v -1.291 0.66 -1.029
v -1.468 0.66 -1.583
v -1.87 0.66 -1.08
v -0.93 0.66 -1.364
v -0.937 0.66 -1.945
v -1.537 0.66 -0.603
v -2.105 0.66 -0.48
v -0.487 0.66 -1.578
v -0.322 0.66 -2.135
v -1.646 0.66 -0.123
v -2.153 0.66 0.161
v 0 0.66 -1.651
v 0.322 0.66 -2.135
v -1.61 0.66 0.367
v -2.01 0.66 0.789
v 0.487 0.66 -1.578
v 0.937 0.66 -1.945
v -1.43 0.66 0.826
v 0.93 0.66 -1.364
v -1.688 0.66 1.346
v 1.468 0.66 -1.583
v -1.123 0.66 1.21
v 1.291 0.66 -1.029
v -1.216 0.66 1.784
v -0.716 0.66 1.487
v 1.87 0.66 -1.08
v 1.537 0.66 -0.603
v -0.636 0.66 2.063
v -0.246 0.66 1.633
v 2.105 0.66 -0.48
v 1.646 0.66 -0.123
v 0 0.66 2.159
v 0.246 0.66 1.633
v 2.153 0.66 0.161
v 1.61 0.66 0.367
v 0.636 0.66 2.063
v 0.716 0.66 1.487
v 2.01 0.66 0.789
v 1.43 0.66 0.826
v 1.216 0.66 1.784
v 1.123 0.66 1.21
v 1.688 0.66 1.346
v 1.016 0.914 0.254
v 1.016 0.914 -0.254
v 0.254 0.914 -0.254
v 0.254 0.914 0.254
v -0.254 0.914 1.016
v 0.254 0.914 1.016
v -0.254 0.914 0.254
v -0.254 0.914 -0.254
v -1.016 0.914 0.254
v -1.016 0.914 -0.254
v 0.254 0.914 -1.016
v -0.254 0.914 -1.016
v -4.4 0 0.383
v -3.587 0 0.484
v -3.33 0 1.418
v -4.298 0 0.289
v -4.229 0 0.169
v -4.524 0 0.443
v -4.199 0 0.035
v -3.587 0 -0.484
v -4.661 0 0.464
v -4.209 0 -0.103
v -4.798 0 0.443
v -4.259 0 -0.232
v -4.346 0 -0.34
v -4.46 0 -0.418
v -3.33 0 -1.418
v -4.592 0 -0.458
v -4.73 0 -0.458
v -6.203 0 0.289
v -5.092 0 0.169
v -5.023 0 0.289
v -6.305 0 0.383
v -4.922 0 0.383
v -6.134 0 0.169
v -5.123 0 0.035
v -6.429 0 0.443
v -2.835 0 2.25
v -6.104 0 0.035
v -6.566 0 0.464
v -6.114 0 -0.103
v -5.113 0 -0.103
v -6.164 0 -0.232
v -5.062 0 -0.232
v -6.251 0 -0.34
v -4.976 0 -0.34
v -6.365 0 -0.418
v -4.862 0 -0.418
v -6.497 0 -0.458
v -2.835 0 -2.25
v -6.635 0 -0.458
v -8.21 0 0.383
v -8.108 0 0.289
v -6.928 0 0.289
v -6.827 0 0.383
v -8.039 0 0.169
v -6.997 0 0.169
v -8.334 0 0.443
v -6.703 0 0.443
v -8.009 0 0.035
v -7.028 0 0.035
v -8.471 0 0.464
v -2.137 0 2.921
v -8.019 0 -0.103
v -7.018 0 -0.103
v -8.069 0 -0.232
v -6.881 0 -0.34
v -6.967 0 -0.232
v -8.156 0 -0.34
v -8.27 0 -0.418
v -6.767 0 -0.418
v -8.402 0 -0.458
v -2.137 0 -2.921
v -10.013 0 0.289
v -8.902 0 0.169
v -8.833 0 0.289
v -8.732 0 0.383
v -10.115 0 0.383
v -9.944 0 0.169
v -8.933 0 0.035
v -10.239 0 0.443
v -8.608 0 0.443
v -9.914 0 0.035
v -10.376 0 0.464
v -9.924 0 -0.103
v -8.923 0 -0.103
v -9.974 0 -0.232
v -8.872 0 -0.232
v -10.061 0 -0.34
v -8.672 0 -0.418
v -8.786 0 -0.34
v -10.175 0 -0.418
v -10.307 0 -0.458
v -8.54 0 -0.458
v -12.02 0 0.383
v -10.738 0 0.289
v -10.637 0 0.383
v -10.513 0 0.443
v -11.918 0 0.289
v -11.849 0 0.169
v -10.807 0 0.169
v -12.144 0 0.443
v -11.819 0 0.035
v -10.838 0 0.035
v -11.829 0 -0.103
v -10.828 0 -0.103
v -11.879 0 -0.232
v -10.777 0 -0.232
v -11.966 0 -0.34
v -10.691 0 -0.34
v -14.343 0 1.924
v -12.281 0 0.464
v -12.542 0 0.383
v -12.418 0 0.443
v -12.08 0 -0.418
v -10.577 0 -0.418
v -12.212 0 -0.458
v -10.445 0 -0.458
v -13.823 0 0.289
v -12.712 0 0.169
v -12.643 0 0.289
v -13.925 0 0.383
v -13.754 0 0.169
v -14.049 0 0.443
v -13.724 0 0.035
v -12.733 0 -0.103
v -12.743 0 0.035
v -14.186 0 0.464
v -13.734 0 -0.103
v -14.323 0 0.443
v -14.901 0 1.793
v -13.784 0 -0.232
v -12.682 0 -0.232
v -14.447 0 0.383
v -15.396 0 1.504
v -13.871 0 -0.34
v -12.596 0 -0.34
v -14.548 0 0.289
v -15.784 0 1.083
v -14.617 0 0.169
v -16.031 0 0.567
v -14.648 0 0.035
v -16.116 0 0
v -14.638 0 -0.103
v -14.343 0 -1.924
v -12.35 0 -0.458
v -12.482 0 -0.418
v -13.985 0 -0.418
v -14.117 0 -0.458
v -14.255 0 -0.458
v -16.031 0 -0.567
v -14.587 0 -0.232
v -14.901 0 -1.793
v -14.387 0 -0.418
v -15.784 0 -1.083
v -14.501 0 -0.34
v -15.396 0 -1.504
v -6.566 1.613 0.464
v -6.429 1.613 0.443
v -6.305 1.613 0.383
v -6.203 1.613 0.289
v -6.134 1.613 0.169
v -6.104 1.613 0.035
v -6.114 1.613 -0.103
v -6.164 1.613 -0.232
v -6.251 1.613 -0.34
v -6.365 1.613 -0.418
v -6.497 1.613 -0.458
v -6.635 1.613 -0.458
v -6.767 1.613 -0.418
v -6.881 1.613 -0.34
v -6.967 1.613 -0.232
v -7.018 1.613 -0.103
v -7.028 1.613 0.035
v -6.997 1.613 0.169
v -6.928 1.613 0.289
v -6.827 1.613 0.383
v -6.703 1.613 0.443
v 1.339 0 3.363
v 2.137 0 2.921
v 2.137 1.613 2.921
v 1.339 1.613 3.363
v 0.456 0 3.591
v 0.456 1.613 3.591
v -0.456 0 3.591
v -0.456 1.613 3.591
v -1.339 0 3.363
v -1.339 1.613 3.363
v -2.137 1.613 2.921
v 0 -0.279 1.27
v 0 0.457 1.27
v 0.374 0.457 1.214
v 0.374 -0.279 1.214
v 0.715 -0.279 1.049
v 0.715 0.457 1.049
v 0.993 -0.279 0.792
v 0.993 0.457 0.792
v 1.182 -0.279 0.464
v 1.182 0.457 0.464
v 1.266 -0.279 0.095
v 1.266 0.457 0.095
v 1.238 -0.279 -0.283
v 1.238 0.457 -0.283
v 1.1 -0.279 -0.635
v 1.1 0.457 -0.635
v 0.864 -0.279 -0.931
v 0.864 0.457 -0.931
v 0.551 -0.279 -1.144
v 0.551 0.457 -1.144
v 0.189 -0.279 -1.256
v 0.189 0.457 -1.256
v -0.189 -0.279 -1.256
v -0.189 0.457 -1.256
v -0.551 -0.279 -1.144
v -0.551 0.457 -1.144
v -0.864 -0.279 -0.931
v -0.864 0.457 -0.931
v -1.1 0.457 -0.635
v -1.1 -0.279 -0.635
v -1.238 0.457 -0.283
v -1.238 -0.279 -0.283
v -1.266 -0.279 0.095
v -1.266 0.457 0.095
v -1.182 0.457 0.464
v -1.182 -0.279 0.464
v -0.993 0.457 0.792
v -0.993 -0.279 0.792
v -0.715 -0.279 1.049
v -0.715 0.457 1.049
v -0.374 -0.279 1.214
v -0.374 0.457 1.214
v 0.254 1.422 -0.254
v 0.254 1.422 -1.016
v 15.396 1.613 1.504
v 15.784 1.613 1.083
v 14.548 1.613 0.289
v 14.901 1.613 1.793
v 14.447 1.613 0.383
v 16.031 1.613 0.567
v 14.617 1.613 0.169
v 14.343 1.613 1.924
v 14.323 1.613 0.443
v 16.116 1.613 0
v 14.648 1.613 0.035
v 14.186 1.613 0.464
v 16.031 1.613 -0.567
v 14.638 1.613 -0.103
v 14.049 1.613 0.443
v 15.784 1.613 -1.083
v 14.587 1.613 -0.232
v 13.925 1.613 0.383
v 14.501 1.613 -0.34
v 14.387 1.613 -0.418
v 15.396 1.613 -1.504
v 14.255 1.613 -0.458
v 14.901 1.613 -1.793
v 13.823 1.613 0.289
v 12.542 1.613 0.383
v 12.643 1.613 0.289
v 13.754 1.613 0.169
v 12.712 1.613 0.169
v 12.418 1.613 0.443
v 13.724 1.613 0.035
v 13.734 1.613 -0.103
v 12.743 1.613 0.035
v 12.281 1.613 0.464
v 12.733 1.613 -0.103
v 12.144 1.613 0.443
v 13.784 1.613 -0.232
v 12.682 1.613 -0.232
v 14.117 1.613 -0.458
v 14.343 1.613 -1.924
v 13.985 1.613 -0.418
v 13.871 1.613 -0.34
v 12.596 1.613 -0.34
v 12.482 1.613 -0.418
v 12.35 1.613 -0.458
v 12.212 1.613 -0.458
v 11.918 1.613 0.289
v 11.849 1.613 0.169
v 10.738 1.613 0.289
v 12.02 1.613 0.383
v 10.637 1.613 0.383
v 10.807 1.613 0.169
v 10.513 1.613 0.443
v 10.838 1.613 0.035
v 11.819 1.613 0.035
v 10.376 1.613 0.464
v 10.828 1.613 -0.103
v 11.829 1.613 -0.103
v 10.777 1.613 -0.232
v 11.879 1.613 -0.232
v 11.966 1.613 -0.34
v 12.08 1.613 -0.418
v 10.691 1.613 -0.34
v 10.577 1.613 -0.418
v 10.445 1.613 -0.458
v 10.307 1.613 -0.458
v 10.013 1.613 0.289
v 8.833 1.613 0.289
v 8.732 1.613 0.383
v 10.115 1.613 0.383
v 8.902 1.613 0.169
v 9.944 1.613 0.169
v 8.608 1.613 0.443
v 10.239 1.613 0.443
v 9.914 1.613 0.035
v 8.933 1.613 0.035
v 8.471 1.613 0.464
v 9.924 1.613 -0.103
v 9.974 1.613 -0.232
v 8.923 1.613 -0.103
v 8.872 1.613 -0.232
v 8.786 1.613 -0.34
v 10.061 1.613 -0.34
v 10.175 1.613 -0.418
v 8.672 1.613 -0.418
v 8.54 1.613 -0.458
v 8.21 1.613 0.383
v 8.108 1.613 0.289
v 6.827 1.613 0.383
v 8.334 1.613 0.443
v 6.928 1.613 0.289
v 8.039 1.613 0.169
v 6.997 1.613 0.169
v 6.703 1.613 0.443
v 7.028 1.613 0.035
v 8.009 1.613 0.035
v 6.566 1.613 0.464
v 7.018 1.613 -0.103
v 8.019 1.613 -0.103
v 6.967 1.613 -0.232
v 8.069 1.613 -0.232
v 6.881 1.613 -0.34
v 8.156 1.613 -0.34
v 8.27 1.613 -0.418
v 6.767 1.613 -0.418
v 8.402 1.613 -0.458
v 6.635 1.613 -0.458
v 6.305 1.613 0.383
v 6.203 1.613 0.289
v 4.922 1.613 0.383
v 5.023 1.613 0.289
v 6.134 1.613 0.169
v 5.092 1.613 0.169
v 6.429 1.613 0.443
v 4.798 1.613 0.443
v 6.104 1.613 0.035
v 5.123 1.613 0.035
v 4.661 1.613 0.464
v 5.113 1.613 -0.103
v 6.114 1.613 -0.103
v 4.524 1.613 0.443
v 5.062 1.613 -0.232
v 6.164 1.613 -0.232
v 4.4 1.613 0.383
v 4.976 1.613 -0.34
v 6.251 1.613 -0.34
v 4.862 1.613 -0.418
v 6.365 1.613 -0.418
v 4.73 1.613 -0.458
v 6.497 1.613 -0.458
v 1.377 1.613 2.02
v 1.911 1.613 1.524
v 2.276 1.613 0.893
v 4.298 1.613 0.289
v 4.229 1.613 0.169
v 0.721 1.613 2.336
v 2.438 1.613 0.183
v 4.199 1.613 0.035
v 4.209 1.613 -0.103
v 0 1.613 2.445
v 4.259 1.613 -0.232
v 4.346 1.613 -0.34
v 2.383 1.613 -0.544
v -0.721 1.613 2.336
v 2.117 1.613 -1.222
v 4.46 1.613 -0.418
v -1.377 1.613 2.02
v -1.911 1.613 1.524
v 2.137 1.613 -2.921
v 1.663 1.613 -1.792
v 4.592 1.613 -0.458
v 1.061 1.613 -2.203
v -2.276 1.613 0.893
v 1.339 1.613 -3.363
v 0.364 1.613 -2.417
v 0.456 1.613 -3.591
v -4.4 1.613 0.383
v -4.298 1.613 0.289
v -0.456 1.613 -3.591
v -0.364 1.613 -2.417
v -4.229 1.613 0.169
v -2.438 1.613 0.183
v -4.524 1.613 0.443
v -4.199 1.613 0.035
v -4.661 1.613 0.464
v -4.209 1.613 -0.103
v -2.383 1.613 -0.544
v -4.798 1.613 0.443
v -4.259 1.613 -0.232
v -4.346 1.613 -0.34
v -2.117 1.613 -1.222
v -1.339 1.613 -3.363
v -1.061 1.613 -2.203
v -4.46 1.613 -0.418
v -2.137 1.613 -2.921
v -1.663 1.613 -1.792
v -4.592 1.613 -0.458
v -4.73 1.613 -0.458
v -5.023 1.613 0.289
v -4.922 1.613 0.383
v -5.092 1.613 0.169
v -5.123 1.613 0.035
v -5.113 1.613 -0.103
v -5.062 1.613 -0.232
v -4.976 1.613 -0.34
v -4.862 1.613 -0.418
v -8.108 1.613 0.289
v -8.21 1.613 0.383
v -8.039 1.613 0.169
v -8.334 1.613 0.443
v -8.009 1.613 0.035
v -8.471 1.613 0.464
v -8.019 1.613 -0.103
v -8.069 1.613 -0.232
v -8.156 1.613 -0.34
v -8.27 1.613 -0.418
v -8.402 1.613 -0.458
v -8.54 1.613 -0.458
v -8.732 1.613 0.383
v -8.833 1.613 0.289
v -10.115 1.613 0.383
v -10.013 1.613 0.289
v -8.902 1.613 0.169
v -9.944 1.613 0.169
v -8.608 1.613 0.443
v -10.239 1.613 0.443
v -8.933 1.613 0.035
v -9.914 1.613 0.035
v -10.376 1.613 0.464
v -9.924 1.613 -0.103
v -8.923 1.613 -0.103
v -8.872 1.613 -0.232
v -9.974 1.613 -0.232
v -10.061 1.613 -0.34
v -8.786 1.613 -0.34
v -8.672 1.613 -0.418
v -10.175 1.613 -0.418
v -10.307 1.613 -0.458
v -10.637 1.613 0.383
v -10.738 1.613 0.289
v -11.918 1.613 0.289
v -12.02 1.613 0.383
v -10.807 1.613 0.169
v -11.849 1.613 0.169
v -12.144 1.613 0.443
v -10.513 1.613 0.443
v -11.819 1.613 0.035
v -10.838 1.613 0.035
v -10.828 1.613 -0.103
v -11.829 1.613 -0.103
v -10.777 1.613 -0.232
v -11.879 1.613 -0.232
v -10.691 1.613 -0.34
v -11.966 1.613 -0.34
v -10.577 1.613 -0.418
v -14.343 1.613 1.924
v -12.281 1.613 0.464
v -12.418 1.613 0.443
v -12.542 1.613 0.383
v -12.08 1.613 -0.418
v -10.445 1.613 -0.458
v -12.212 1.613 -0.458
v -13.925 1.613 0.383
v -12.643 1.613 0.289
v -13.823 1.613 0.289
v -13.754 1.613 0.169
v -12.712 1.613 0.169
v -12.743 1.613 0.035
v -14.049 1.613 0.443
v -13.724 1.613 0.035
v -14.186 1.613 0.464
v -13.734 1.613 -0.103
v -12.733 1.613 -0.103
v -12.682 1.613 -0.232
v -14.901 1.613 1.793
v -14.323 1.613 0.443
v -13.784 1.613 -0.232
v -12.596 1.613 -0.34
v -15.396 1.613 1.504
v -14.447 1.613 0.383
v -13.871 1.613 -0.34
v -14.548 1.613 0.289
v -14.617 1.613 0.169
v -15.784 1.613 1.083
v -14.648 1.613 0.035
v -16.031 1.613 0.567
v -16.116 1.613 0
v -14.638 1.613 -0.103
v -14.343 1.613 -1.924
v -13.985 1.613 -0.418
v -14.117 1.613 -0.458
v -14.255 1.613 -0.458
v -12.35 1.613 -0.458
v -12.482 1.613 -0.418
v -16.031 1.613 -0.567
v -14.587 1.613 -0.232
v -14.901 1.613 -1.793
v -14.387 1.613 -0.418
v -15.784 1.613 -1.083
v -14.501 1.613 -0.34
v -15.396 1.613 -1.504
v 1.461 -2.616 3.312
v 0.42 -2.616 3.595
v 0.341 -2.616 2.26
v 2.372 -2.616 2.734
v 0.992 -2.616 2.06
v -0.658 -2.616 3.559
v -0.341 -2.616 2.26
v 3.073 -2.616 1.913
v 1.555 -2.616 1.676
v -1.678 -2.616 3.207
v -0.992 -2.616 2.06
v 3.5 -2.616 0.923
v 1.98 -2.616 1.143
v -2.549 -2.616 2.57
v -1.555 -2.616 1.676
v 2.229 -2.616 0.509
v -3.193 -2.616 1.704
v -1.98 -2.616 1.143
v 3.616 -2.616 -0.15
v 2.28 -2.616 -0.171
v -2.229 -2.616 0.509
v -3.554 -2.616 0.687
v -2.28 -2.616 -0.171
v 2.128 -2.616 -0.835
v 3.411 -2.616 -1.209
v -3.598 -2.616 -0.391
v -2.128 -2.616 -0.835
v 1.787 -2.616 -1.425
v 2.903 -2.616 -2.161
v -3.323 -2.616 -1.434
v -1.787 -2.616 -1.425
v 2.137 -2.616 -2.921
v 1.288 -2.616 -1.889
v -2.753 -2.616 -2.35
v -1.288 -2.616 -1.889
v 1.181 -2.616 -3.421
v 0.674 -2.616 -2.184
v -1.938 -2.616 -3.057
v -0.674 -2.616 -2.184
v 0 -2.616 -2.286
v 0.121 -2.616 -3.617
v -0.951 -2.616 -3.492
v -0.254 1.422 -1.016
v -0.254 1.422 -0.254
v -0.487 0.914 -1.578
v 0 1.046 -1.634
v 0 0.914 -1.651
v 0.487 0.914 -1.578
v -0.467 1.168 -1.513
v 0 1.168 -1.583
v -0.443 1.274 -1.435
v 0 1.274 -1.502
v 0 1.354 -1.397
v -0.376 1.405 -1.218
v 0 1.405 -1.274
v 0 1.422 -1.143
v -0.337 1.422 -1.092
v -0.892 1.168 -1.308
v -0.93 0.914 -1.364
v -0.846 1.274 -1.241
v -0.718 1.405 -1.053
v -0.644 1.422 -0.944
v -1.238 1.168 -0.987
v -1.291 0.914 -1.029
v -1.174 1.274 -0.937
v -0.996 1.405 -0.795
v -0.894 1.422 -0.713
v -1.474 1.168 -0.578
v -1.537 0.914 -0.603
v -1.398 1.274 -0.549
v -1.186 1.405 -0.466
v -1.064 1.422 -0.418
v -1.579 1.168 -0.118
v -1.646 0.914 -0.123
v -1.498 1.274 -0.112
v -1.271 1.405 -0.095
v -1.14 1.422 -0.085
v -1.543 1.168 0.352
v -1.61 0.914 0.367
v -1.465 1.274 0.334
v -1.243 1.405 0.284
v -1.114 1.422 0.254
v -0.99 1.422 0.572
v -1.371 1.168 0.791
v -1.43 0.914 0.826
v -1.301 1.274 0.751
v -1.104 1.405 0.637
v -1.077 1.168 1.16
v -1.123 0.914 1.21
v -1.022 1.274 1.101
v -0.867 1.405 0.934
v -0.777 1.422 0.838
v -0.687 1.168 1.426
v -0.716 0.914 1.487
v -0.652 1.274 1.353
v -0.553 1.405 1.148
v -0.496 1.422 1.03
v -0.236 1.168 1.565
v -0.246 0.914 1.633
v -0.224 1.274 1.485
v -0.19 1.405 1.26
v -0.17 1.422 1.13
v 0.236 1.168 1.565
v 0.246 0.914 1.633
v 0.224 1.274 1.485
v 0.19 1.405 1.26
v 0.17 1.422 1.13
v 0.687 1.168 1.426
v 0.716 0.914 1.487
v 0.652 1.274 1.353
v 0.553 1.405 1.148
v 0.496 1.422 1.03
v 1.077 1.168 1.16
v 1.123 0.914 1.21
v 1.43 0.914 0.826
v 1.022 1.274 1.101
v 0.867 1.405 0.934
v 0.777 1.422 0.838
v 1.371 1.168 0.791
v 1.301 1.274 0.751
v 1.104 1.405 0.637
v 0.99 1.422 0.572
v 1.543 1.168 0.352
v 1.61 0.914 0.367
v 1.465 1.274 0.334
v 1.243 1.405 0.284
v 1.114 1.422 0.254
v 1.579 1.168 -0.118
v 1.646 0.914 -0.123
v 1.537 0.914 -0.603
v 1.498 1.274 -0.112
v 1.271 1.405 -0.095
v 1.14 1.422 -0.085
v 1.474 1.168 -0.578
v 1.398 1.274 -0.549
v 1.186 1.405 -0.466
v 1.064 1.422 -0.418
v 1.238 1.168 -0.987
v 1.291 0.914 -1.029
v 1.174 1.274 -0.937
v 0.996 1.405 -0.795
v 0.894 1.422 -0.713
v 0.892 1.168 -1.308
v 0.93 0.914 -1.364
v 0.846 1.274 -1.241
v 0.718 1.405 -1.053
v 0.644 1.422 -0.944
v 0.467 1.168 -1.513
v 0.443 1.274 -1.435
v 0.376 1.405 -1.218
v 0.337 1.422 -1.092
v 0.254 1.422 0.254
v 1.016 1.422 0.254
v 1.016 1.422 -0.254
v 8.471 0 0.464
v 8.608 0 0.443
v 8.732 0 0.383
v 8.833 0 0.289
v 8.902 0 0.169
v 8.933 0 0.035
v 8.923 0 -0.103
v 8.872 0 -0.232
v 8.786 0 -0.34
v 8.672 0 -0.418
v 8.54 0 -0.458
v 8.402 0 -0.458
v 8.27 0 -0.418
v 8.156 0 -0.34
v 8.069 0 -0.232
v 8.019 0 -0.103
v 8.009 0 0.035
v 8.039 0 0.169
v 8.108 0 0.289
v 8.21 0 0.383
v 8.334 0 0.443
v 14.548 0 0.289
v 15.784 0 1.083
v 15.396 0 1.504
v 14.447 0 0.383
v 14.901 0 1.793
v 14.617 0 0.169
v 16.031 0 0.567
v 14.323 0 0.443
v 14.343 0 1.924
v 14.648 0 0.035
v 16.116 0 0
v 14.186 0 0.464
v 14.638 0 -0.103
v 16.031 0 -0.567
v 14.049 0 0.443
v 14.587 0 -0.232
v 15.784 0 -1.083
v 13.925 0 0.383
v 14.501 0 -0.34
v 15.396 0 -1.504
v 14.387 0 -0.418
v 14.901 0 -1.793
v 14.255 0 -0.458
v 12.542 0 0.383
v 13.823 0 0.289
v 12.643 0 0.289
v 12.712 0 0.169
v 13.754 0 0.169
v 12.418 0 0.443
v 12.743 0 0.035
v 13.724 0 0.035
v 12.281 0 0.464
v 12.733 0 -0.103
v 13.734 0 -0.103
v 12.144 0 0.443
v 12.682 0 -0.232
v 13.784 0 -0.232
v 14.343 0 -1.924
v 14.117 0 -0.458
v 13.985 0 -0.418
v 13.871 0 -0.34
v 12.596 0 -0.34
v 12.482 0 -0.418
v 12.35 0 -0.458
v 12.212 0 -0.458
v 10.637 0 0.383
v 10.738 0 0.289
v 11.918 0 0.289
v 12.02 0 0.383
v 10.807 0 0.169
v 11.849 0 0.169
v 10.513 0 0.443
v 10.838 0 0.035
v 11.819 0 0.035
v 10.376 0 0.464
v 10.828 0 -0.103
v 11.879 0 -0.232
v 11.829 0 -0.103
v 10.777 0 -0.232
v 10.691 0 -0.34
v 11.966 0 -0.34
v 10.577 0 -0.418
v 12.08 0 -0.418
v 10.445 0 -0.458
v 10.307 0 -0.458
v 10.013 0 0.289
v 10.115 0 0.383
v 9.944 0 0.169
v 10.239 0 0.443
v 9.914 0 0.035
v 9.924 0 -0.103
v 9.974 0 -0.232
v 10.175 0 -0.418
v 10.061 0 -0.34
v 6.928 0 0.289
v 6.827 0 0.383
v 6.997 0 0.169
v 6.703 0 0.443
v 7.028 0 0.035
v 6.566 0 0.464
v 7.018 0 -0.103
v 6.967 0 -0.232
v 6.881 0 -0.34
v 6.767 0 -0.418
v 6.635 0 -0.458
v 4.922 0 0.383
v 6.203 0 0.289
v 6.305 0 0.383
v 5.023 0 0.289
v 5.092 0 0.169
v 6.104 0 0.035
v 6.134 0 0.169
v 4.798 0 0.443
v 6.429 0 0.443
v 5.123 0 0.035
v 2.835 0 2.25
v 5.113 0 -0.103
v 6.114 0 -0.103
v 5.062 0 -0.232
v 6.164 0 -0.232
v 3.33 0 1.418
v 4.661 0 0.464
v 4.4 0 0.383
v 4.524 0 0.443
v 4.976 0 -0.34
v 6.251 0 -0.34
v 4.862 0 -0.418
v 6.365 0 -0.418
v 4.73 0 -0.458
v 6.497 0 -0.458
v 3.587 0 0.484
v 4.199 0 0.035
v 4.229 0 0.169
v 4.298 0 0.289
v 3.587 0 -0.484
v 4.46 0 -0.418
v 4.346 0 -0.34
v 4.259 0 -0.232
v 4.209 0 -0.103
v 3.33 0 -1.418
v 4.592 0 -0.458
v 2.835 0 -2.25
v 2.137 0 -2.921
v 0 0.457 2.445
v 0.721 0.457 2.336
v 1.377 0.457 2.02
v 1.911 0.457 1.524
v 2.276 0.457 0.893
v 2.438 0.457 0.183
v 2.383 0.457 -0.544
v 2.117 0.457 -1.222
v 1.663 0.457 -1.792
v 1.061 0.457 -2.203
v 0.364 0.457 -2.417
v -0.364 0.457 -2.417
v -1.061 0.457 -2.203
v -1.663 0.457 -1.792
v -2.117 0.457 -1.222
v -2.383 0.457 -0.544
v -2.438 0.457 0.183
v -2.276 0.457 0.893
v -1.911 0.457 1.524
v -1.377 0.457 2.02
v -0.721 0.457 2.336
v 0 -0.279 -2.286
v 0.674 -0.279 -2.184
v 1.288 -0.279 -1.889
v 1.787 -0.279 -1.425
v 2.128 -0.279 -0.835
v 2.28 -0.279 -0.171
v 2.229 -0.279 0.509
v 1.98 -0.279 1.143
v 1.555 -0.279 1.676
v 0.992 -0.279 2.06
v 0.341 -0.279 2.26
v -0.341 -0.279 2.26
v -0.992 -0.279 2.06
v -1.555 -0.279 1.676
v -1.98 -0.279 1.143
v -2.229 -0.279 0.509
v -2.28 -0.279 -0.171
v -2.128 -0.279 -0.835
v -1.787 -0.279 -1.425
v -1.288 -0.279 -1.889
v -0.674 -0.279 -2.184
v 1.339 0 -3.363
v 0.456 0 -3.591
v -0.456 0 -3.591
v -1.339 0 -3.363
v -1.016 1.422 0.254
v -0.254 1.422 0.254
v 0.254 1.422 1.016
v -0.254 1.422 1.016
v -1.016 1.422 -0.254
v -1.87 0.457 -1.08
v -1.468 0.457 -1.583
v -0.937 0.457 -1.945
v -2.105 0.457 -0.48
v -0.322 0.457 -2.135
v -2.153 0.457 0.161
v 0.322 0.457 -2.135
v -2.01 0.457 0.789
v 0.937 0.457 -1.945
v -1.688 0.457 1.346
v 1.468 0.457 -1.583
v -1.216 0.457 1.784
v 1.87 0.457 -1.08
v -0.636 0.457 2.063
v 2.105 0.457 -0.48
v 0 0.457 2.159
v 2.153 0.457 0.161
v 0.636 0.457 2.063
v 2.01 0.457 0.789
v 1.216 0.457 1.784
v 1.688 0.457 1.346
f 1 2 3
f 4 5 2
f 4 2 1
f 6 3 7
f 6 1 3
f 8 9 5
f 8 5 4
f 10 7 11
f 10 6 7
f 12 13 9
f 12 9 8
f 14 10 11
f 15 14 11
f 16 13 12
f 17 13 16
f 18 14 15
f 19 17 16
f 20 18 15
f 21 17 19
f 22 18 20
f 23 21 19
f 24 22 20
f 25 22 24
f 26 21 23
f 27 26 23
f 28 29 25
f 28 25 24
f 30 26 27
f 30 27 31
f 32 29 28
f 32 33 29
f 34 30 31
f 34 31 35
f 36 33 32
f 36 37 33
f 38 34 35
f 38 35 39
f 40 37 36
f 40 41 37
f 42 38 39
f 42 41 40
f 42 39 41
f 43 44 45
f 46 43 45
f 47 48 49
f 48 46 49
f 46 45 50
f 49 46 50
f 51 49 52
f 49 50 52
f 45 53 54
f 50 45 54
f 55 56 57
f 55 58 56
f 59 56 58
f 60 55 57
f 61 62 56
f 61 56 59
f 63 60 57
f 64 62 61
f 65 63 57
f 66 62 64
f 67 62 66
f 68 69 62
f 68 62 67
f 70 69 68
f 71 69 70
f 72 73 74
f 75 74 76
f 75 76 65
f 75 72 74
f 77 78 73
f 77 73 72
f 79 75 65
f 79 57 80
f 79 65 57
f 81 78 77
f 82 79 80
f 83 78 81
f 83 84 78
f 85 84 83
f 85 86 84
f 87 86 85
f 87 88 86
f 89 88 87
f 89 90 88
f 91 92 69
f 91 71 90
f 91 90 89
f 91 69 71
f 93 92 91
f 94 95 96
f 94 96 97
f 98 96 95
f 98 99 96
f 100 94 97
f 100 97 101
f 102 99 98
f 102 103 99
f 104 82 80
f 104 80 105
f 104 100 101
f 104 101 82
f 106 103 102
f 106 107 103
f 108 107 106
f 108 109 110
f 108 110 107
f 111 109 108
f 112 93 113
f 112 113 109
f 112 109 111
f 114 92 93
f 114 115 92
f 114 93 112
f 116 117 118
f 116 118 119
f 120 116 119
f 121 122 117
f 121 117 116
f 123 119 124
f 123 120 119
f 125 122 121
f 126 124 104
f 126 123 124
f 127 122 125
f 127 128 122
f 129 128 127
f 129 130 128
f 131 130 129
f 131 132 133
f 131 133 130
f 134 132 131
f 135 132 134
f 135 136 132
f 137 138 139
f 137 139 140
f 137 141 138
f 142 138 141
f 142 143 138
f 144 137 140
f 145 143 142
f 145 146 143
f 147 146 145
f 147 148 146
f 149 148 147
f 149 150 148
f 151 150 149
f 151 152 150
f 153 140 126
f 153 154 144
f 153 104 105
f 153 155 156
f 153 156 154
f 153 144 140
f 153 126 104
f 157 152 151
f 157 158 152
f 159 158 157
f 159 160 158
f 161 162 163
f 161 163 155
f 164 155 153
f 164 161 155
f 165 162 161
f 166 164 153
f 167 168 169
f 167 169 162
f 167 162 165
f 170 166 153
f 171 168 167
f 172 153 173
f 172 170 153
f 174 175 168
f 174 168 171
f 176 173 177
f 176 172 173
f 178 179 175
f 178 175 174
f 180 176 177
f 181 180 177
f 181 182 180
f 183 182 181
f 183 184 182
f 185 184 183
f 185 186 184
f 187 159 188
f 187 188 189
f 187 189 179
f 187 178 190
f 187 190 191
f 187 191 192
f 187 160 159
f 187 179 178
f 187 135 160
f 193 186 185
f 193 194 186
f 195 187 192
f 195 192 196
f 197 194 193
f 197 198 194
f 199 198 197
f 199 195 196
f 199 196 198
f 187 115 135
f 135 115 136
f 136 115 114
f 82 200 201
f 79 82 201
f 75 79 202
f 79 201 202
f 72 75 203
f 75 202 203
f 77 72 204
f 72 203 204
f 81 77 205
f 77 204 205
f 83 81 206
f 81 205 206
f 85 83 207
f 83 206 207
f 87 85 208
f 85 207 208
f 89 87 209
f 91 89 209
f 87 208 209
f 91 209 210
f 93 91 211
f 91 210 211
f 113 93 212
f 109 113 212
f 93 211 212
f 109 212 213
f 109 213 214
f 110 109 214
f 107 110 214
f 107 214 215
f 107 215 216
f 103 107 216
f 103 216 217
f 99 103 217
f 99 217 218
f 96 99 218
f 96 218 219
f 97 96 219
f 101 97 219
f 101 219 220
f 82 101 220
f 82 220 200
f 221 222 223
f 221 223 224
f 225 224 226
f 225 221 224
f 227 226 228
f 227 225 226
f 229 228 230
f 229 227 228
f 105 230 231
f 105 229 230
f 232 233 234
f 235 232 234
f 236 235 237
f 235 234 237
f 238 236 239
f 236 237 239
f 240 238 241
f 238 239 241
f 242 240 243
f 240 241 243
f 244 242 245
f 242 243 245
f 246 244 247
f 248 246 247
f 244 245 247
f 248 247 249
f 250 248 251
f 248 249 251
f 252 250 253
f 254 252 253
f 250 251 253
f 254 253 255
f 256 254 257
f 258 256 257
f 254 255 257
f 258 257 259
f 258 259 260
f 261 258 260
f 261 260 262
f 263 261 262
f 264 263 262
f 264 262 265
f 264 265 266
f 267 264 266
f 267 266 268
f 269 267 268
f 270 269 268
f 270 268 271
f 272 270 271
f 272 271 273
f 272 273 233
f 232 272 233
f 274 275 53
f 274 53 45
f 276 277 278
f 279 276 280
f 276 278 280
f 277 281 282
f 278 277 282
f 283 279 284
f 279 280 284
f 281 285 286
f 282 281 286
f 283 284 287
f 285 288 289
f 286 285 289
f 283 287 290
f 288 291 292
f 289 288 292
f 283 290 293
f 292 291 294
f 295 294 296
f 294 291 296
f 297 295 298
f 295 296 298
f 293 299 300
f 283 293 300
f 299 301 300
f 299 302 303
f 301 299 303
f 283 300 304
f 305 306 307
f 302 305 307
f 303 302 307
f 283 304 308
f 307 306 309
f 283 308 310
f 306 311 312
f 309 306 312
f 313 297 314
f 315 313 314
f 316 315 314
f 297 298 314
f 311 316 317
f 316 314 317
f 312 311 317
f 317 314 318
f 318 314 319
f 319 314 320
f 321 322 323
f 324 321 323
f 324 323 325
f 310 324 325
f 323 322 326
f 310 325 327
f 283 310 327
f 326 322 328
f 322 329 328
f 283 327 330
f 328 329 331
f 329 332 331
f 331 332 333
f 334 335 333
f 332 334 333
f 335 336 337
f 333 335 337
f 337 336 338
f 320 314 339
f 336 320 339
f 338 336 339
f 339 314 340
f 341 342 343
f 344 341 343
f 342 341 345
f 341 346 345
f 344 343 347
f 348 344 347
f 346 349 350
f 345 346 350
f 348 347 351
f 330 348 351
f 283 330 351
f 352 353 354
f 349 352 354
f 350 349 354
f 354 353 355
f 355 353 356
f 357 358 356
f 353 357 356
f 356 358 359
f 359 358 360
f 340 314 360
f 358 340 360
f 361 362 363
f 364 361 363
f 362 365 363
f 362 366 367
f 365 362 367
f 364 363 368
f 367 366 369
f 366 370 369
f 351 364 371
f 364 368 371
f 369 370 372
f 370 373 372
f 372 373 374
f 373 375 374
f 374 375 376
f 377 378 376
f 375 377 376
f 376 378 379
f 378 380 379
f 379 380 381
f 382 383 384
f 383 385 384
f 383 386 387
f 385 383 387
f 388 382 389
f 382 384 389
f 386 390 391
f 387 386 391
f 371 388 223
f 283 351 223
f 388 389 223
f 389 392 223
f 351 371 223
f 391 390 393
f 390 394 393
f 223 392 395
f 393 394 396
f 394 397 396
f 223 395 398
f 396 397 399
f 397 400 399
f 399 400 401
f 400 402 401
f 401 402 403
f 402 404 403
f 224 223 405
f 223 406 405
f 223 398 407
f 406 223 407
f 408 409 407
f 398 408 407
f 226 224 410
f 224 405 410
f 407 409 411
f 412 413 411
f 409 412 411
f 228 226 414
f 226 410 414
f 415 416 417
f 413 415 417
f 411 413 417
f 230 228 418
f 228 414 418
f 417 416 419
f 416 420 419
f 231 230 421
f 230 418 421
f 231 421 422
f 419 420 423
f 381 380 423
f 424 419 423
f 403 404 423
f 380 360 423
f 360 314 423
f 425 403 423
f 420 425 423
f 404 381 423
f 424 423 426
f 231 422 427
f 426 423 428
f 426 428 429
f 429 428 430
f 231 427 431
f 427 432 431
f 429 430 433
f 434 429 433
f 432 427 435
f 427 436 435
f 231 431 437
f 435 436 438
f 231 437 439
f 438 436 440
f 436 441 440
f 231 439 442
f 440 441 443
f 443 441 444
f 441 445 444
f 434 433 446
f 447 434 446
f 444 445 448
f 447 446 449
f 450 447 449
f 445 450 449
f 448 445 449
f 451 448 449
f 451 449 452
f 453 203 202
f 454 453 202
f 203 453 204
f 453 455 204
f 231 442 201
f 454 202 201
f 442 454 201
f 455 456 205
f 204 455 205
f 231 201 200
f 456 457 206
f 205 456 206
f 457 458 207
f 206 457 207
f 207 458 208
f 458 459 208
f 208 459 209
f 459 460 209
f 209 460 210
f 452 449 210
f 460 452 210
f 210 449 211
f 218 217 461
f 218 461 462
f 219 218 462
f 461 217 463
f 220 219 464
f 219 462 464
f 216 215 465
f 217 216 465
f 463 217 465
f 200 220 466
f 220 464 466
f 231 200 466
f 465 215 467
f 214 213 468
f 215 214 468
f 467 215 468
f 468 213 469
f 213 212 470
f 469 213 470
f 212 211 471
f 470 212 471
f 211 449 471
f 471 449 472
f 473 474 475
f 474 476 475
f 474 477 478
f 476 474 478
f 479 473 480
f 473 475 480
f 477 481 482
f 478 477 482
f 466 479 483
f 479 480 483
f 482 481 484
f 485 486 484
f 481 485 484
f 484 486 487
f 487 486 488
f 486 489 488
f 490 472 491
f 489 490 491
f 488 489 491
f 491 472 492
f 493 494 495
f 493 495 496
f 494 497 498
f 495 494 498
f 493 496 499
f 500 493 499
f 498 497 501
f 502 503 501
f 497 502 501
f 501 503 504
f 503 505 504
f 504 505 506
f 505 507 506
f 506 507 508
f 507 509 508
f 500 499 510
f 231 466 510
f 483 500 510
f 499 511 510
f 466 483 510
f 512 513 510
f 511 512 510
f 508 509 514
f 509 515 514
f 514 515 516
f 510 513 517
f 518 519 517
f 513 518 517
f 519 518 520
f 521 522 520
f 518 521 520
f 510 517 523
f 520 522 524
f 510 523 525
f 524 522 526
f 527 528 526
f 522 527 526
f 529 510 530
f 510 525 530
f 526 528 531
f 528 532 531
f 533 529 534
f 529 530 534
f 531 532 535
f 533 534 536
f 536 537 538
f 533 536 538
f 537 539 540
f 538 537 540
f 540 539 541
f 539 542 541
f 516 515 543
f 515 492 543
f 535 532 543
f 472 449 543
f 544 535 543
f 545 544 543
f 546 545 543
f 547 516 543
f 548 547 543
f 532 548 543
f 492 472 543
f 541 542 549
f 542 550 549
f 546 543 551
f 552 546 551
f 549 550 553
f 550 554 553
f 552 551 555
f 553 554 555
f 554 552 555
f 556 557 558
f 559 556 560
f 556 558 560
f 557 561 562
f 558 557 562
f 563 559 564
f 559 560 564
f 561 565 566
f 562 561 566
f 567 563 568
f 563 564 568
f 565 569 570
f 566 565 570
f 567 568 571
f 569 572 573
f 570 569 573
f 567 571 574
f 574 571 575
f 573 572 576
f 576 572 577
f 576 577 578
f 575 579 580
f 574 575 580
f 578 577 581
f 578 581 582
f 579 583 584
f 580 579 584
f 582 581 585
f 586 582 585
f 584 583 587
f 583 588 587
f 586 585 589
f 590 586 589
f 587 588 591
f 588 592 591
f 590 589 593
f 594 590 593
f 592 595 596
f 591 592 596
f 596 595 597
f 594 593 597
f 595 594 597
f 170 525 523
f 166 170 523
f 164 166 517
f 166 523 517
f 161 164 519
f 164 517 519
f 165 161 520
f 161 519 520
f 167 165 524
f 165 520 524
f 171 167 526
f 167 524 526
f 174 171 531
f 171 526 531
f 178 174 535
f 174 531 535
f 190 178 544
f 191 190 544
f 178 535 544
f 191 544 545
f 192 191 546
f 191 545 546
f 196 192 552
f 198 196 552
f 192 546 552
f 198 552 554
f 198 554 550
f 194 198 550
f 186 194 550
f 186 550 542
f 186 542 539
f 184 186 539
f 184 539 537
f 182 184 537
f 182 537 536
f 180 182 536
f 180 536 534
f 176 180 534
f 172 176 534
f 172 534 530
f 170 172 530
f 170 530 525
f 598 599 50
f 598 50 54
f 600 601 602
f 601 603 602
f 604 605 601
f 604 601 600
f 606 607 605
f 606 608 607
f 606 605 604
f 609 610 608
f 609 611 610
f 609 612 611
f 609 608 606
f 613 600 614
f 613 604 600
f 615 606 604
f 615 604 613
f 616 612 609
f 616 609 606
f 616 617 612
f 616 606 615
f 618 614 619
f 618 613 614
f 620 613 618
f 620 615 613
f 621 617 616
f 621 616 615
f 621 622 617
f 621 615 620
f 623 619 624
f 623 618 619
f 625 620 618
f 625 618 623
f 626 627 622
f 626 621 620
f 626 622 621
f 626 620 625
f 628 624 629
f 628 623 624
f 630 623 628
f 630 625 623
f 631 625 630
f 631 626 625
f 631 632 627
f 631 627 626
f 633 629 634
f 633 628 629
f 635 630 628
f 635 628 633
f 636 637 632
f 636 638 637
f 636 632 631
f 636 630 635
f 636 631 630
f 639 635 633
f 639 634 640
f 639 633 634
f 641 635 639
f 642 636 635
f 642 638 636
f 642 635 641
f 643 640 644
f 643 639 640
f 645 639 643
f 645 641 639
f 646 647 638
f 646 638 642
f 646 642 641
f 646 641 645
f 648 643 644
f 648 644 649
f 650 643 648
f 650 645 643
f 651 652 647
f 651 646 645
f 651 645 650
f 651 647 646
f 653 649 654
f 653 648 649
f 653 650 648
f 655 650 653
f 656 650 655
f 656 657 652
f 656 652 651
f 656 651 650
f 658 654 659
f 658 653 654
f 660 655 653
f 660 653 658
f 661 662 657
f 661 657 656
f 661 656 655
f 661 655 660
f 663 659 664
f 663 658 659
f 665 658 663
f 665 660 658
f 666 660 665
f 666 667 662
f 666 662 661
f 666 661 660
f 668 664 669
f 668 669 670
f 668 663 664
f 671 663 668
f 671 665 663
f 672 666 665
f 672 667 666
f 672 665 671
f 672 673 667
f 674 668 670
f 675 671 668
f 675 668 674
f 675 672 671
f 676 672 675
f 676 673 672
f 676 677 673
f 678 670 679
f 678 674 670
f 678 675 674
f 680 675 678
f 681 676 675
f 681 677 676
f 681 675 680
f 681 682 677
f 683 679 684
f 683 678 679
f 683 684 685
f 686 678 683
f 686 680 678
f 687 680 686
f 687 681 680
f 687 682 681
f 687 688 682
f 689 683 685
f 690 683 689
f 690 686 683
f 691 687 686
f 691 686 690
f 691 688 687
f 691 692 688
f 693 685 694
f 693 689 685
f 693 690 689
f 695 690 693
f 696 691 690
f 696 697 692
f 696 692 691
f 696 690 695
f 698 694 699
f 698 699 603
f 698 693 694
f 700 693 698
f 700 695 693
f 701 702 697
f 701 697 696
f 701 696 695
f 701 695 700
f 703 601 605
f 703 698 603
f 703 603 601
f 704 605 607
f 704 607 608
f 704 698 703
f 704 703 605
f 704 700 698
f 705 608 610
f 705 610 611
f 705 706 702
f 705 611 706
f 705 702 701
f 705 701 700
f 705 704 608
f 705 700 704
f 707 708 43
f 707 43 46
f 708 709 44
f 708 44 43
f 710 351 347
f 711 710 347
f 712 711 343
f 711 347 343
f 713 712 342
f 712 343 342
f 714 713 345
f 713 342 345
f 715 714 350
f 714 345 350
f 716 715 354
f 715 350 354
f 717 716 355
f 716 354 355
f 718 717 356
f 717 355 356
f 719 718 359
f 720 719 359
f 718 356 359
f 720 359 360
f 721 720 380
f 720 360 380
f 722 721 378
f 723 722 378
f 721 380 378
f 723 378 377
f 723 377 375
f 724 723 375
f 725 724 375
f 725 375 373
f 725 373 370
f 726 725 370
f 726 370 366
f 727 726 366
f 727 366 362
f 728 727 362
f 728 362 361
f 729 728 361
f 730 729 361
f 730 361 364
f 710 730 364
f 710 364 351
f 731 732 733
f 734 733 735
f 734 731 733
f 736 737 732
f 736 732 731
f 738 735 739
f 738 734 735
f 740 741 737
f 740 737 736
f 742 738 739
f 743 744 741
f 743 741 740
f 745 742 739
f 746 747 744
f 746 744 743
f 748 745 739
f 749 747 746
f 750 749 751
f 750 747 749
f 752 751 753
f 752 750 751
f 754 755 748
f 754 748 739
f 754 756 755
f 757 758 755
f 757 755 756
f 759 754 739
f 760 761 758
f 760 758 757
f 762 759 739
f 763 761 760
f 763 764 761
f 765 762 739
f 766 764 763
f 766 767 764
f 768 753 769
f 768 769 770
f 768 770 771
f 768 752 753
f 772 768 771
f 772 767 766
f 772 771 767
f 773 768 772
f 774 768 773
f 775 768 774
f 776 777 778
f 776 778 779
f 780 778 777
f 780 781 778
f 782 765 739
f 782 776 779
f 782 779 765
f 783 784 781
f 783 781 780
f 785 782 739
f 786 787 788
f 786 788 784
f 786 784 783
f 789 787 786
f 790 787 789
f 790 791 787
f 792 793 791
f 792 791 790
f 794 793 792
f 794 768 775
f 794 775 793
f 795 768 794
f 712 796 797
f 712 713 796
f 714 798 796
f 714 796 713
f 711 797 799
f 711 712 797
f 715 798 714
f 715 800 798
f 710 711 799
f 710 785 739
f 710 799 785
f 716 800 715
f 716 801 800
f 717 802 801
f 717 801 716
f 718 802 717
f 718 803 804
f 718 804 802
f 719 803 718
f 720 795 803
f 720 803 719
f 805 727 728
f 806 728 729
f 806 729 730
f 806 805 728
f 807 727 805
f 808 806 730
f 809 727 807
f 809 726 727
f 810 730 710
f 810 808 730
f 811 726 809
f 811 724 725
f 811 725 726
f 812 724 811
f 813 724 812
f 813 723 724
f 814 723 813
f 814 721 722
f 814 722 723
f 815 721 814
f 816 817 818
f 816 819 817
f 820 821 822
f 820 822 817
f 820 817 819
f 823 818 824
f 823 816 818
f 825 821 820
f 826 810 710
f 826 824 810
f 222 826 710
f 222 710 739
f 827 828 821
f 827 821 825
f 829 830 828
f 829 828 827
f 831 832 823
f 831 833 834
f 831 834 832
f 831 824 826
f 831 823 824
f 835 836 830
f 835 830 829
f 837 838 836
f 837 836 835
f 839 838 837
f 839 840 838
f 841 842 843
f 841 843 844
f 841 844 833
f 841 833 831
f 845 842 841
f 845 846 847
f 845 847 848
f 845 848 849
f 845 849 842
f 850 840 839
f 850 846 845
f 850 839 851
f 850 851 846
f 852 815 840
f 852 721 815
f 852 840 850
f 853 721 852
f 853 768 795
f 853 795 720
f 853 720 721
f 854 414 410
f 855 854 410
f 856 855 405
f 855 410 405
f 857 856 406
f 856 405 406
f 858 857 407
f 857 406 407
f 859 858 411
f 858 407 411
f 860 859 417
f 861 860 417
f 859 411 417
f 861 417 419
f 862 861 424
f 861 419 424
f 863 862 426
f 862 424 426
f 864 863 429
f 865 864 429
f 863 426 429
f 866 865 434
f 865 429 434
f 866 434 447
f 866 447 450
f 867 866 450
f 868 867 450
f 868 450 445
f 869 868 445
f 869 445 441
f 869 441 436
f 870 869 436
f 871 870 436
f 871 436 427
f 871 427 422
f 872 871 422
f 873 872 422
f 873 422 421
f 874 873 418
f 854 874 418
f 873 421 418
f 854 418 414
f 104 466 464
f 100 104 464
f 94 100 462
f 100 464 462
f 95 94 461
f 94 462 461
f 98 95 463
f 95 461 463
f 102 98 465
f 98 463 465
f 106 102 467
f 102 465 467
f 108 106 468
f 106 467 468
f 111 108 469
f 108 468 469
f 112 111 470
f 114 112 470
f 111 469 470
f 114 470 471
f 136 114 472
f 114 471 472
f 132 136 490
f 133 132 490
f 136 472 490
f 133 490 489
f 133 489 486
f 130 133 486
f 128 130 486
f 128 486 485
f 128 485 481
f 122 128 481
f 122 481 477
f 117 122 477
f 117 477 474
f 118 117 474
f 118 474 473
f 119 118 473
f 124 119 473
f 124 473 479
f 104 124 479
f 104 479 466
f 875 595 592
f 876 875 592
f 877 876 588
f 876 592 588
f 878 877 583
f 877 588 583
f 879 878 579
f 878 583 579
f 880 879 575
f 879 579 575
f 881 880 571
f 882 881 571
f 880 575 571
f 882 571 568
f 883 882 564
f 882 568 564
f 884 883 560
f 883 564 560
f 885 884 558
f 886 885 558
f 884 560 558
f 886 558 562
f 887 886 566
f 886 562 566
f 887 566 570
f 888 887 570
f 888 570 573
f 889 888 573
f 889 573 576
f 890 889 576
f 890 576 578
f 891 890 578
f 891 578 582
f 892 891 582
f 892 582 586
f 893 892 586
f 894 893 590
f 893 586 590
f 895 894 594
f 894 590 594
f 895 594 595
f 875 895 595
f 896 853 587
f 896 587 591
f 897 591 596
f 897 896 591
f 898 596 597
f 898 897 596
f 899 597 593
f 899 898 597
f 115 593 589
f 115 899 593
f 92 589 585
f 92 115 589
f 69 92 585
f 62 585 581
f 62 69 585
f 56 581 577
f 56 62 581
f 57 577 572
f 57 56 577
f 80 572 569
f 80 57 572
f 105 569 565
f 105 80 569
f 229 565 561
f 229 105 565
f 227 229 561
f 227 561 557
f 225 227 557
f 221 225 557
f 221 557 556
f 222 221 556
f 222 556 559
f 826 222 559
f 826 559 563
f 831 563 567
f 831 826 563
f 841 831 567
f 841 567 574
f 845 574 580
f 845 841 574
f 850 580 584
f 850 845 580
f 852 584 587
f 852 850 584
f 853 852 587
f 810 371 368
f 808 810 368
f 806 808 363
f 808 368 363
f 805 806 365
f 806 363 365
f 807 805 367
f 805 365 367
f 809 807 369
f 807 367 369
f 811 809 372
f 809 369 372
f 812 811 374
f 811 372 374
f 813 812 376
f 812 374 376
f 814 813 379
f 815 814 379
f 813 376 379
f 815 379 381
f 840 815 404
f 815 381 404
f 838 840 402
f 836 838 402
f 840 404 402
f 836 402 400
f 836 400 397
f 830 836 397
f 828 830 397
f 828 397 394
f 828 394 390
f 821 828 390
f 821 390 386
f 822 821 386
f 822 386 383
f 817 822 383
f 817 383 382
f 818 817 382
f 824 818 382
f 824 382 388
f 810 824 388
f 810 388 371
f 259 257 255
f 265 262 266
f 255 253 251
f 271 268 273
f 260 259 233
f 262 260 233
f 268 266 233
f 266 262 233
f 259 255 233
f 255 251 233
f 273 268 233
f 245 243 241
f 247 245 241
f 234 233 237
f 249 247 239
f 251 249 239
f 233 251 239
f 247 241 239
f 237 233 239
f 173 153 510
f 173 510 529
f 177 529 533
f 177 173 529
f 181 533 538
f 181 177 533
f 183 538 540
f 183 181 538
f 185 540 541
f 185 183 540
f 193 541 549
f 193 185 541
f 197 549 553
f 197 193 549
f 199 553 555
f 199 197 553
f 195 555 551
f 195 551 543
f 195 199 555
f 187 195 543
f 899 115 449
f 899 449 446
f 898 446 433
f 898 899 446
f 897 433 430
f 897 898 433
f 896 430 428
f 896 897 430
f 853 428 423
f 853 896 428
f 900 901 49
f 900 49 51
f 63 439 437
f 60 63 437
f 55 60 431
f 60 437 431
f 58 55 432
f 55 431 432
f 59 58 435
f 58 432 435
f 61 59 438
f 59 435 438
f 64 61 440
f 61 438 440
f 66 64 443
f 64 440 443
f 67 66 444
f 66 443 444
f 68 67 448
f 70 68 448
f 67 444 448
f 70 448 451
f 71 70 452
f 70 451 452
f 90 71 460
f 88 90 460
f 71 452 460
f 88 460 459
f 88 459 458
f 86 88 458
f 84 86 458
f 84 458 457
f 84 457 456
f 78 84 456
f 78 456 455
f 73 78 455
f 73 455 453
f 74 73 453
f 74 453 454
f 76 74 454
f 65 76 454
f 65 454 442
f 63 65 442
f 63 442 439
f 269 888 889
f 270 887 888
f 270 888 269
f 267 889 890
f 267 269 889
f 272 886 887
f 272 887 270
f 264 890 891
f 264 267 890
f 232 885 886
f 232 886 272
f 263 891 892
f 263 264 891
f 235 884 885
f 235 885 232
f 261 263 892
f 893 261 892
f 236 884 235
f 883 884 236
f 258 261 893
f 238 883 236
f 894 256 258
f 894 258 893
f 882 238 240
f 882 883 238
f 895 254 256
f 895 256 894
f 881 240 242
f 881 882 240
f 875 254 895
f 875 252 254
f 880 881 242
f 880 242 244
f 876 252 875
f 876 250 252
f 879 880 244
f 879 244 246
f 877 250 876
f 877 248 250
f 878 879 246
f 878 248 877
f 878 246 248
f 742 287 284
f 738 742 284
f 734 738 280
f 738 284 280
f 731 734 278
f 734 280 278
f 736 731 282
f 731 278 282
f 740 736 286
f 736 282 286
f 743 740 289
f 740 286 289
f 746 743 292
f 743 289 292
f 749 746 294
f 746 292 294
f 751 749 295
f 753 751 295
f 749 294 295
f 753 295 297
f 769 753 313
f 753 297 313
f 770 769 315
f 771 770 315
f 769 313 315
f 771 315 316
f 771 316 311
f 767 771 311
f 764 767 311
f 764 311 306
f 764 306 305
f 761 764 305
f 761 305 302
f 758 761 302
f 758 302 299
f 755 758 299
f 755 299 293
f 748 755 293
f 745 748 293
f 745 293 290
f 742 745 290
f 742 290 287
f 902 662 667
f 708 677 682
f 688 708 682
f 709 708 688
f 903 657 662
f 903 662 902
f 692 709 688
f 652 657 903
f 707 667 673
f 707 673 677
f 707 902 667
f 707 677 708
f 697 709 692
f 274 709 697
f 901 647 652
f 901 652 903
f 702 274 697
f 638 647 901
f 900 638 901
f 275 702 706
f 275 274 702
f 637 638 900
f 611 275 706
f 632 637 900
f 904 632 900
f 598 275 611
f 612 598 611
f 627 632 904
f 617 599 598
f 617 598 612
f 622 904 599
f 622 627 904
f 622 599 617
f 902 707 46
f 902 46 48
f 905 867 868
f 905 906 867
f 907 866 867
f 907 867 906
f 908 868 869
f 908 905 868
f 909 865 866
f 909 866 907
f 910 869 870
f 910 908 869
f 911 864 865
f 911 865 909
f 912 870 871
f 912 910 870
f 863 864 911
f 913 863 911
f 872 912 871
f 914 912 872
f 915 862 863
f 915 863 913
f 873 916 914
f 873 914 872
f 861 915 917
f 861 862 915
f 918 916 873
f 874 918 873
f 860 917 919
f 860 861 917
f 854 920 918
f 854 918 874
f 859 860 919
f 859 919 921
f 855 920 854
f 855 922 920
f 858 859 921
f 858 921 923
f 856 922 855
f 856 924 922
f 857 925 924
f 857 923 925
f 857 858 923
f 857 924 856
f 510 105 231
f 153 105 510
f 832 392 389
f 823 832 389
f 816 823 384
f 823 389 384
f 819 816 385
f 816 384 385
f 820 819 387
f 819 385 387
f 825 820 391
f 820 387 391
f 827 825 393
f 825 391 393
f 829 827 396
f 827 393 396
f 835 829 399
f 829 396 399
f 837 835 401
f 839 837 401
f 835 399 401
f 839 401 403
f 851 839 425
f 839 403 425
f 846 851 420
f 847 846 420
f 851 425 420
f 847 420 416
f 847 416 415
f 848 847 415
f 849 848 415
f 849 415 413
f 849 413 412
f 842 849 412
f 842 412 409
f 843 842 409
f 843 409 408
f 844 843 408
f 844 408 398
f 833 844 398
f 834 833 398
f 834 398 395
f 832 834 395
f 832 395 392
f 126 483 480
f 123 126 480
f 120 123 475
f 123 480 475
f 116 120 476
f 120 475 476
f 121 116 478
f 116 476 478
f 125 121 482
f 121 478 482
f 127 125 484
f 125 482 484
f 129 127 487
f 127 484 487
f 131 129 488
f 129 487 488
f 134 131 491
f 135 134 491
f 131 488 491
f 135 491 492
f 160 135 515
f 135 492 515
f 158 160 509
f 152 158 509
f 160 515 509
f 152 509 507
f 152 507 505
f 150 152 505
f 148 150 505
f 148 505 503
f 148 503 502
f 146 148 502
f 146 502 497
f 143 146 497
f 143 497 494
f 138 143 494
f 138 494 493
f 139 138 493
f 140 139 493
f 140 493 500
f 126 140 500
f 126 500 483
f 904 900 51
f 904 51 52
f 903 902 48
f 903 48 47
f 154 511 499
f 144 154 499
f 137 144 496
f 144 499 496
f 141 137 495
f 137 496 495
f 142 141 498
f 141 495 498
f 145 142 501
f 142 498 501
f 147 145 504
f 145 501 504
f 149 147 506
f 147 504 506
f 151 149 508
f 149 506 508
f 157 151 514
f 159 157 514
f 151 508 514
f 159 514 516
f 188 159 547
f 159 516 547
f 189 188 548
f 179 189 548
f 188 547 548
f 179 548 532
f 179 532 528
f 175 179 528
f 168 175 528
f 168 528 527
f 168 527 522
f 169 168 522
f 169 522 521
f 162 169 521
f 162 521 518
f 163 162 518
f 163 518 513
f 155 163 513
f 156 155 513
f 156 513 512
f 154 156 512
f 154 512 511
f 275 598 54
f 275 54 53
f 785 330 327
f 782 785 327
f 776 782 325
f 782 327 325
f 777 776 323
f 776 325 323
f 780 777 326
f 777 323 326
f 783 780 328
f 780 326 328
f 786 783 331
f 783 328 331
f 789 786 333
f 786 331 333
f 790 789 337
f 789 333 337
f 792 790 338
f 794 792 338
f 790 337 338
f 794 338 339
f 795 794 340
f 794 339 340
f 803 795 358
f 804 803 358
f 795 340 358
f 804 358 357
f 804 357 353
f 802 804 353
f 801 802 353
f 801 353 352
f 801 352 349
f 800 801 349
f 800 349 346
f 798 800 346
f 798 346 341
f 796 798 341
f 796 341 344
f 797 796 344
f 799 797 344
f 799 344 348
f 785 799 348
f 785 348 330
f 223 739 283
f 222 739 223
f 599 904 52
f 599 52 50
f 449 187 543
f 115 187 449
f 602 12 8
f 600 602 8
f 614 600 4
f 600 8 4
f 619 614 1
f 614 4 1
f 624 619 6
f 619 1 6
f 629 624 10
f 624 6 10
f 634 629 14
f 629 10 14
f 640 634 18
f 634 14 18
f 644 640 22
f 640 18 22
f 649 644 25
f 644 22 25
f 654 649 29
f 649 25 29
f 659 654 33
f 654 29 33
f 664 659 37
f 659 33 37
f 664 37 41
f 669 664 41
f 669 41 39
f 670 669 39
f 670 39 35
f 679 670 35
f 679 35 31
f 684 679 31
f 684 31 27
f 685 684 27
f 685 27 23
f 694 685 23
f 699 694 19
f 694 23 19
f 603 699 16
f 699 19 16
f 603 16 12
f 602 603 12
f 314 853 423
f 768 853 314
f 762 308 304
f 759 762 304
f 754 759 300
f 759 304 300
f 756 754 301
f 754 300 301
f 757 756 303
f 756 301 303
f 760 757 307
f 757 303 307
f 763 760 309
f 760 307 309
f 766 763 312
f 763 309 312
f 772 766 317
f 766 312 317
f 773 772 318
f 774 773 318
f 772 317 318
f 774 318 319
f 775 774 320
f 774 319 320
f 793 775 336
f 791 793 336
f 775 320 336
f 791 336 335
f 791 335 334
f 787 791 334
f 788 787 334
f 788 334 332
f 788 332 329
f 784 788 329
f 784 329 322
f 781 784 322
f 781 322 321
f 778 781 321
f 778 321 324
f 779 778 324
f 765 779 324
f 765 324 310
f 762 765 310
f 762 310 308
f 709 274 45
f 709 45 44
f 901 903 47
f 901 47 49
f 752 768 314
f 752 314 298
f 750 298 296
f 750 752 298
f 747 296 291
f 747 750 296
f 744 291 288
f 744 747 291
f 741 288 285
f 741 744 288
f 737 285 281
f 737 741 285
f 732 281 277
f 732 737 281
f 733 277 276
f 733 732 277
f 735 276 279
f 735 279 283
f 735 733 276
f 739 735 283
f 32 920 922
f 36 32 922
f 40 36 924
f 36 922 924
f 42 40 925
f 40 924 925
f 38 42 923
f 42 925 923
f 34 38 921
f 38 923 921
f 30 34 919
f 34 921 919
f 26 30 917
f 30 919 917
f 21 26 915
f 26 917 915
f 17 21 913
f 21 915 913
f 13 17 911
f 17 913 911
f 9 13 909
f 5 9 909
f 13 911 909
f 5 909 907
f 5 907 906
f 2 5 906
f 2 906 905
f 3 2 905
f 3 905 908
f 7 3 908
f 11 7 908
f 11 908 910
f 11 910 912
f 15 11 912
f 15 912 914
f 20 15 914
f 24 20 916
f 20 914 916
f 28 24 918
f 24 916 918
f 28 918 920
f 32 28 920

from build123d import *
from build123d.topology import SkipClean

# Parameters (mm, degrees)
EXTRUDE17_DEPTH = 1.6129
SKETCH19_R      = 3.6195
EXTRUDE19_DEPTH = 4.2291
SKETCH20_R      = 0.46355
SKETCH20_R_2    = 1.27
EXTRUDE20_DEPTH = 18.050548
SKETCH21_R      = 2.44475
EXTRUDE21_DEPTH = 1.1557
SKETCH22_R      = 2.286
EXTRUDE22_DEPTH = 2.3368
SKETCH23_R      = 2.159
EXTRUDE23_DEPTH = 0.2032
SKETCH24_R      = 1.651
EXTRUDE24_DEPTH = 0.762
EXTRUDE25_DEPTH = 0.508
FILLET1_R       = 0.508


with BuildPart() as part:
    # Sketch18 → Extrude17 (new body)
    with BuildSketch(Plane(origin=(0, 0, 0), x_dir=(1, 0, 0), z_dir=(0, 1, 0))):
        with BuildLine():
            Line((-14.34306, 1.923992), (-2.137414, 2.921))
            ThreePointArc((-2.137414, 2.921), (0, 3.6195), (2.137414, 2.921))
            Line((2.137414, 2.921), (14.34306, 1.923992))
            ThreePointArc((14.34306, 1.923992), (16.1163, 0), (14.34306, -1.923992))
            Line((14.34306, -1.923992), (2.137414, -2.921))
            ThreePointArc((2.137414, -2.921), (0, -3.6195), (-2.137414, -2.921))
            Line((-2.137414, -2.921), (-14.34306, -1.923992))
            ThreePointArc((-14.34306, -1.923992), (-16.1163, 0), (-14.34306, 1.923992))
        make_face()
    extrude(amount=EXTRUDE17_DEPTH)

    # Sketch19 → Extrude19 (add)
    with SkipClean():  # the faces are left unmerged after this step: merging them gives an invalid solid
        with BuildSketch(Plane(origin=(0, 1.6129, 0), x_dir=(1, 0, 0), z_dir=(0, 1, 0))):
            with Locations(Location((0, 0, 0), (0, 0, 53.805553))):
                Circle(SKETCH19_R)
        extrude(amount=-EXTRUDE19_DEPTH)

    # Sketch20 → Extrude20 (cut, through all)
    with SkipClean():  # the faces are left unmerged after this step: merging them gives an invalid solid
        with BuildSketch(Plane(origin=(0, 1.6129, 0), x_dir=(1, 0, 0), z_dir=(0, 1, 0))):
            with Locations(Location((-14.1859, 0, 0), (0, 0, 270))):
                Circle(SKETCH20_R)
            with Locations(Location((0, 0, 0), (0, 0, 270))):
                Circle(SKETCH20_R_2)
            with Locations(Location((12.2809, 0, 0), (0, 0, 270))):
                Circle(SKETCH20_R)
            with Locations(Location((-4.6609, 0, 0), (0, 0, 270))):
                Circle(SKETCH20_R)
            with Locations(Location((-6.5659, 0, 0), (0, 0, 270))):
                Circle(SKETCH20_R)
            with Locations(Location((-8.4709, 0, 0), (0, 0, 270))):
                Circle(SKETCH20_R)
            with Locations(Location((-10.3759, 0, 0), (0, 0, 270))):
                Circle(SKETCH20_R)
            with Locations(Location((-12.2809, 0, 0), (0, 0, 270))):
                Circle(SKETCH20_R)
            with Locations(Location((10.3759, 0, 0), (0, 0, 270))):
                Circle(SKETCH20_R)
            with Locations(Location((8.4709, 0, 0), (0, 0, 270))):
                Circle(SKETCH20_R)
            with Locations(Location((6.5659, 0, 0), (0, 0, 270))):
                Circle(SKETCH20_R)
            with Locations(Location((4.6609, 0, 0), (0, 0, 270))):
                Circle(SKETCH20_R)
            with Locations(Location((14.1859, 0, 0), (0, 0, 270))):
                Circle(SKETCH20_R)
        extrude(amount=-EXTRUDE20_DEPTH, mode=Mode.SUBTRACT)

    # Sketch21 → Extrude21 (cut)
    with SkipClean():  # the faces are left unmerged after this step: merging them gives an invalid solid
        with BuildSketch(Plane(origin=(0, 1.6129, 0), x_dir=(1, 0, 0), z_dir=(0, 1, 0))):
            with Locations(Location((0, 0, 0), (0, 0, 270))):
                Circle(SKETCH21_R)
        extrude(amount=-EXTRUDE21_DEPTH, mode=Mode.SUBTRACT)

    # Sketch22 → Extrude22 (cut)
    with SkipClean():  # the faces are left unmerged after this step: merging them gives an invalid solid
        with BuildSketch(Plane.XZ.offset(2.6162)):
            with Locations(Location((0, 0, 0), (0, 0, 270))):
                Circle(SKETCH22_R)
        extrude(amount=-EXTRUDE22_DEPTH, mode=Mode.SUBTRACT)



with BuildPart() as body_2:
    # Sketch23 → Extrude23 (new body)
    with BuildSketch(Plane(origin=(0, 0.4572, 0), x_dir=(1, 0, 0), z_dir=(0, 1, 0))):
        with Locations(Location((0, 0, 0), (0, 0, 270))):
            Circle(SKETCH23_R)
    extrude(amount=EXTRUDE23_DEPTH)


with BuildPart() as part_1:
    with SkipClean():  # the faces are left unmerged after this step: merging them gives an invalid solid
        add(part.part)

        add(body_2.part)  # Extrude24 merges body 2
        # Sketch24 → Extrude24 (add)
        with BuildSketch(Plane(origin=(0, 0.6604, 0), x_dir=(1, 0, 0), z_dir=(0, 1, 0))):
            with Locations(Location((0, 0, 0), (0, 0, 90))):
                Circle(SKETCH24_R)
        extrude(amount=EXTRUDE24_DEPTH)

    # Sketch25 → Extrude25 (cut)
    with SkipClean():  # the faces are left unmerged after this step: merging them gives an invalid solid
        with BuildSketch(Plane(origin=(0, 1.4224, 0), x_dir=(1, 0, 0), z_dir=(0, 1, 0))):
            Polygon((0.254, -1.016), (-0.254, -1.016), (-0.254, -0.254), (-1.016, -0.254), (-1.016, 0.254), (-0.254, 0.254), (-0.254, 1.016), (0.254, 1.016), (0.254, 0.254), (1.016, 0.254), (1.016, -0.254), (0.254, -0.254), align=None)
        extrude(amount=-EXTRUDE25_DEPTH, mode=Mode.SUBTRACT)

    # Fillet1
    fillet1_edges = [part_1.edges().sort_by_distance(p)[0] for p in [
        (0, 1.4224, 1.651),
    ]]
    fillet(fillet1_edges, radius=FILLET1_R)


solid = part_1.part
